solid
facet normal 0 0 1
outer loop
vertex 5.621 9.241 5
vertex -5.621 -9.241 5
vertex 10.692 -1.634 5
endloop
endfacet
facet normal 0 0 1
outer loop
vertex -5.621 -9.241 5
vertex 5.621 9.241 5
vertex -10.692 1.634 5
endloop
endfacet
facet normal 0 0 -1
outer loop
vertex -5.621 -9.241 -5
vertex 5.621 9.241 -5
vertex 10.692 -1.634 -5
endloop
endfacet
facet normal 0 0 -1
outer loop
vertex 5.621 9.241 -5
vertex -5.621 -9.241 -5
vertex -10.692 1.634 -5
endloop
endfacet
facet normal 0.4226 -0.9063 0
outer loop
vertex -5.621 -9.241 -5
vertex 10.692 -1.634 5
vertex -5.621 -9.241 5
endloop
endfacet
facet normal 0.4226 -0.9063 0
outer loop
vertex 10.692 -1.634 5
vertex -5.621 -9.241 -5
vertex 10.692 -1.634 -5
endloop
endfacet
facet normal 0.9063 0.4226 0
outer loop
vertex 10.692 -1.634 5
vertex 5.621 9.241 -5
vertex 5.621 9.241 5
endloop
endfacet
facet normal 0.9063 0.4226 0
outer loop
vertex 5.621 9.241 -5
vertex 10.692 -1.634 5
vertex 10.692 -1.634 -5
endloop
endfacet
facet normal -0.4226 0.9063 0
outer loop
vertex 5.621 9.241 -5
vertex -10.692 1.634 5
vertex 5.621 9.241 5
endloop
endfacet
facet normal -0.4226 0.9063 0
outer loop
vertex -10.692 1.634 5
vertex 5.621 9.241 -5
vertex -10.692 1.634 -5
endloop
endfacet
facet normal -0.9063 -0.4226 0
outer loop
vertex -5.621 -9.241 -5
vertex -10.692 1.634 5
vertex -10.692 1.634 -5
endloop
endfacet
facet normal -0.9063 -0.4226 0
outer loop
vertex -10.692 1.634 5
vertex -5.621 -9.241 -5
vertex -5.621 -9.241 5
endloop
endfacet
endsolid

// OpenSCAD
// Auto-generated from tests/data/feature_fixtures_manifest.json
// fixture: box_plain_rotated_z25
// fixture_type: box
// description: Plain rotated box (no holes) to verify rotated-box detection — the simplest positive rotated-box case.
// transform: rotate=[0.000000, 0.000000, 25.000000], translate=[0.000000, 0.000000, 0.000000]
$fn = 96;

box_size = [18.000000, 12.000000, 10.000000];
box_origin = [-9.000000, -6.000000, -5.000000];

module through_hole_x(center, diameter, length) {
  translate([box_origin[0] - 0.1, center[1], center[2]])
    rotate(a=90, v=[0, 1, 0]) cylinder(d=diameter, h=length, center=false);
}

module through_hole_y(center, diameter, length) {
  translate([center[0], box_origin[1] - 0.1, center[2]])
    rotate(a=90, v=[-1, 0, 0]) cylinder(d=diameter, h=length, center=false);
}

module through_hole_z(center, diameter, length) {
  translate([center[0], center[1], box_origin[2] - 0.1])
    cylinder(d=diameter, h=length, center=false);
}

translate([0.000000, 0.000000, 0.000000])
rotate([0.000000, 0.000000, 25.000000]) {
difference() {
  translate(box_origin) cube(box_size);
}
}
